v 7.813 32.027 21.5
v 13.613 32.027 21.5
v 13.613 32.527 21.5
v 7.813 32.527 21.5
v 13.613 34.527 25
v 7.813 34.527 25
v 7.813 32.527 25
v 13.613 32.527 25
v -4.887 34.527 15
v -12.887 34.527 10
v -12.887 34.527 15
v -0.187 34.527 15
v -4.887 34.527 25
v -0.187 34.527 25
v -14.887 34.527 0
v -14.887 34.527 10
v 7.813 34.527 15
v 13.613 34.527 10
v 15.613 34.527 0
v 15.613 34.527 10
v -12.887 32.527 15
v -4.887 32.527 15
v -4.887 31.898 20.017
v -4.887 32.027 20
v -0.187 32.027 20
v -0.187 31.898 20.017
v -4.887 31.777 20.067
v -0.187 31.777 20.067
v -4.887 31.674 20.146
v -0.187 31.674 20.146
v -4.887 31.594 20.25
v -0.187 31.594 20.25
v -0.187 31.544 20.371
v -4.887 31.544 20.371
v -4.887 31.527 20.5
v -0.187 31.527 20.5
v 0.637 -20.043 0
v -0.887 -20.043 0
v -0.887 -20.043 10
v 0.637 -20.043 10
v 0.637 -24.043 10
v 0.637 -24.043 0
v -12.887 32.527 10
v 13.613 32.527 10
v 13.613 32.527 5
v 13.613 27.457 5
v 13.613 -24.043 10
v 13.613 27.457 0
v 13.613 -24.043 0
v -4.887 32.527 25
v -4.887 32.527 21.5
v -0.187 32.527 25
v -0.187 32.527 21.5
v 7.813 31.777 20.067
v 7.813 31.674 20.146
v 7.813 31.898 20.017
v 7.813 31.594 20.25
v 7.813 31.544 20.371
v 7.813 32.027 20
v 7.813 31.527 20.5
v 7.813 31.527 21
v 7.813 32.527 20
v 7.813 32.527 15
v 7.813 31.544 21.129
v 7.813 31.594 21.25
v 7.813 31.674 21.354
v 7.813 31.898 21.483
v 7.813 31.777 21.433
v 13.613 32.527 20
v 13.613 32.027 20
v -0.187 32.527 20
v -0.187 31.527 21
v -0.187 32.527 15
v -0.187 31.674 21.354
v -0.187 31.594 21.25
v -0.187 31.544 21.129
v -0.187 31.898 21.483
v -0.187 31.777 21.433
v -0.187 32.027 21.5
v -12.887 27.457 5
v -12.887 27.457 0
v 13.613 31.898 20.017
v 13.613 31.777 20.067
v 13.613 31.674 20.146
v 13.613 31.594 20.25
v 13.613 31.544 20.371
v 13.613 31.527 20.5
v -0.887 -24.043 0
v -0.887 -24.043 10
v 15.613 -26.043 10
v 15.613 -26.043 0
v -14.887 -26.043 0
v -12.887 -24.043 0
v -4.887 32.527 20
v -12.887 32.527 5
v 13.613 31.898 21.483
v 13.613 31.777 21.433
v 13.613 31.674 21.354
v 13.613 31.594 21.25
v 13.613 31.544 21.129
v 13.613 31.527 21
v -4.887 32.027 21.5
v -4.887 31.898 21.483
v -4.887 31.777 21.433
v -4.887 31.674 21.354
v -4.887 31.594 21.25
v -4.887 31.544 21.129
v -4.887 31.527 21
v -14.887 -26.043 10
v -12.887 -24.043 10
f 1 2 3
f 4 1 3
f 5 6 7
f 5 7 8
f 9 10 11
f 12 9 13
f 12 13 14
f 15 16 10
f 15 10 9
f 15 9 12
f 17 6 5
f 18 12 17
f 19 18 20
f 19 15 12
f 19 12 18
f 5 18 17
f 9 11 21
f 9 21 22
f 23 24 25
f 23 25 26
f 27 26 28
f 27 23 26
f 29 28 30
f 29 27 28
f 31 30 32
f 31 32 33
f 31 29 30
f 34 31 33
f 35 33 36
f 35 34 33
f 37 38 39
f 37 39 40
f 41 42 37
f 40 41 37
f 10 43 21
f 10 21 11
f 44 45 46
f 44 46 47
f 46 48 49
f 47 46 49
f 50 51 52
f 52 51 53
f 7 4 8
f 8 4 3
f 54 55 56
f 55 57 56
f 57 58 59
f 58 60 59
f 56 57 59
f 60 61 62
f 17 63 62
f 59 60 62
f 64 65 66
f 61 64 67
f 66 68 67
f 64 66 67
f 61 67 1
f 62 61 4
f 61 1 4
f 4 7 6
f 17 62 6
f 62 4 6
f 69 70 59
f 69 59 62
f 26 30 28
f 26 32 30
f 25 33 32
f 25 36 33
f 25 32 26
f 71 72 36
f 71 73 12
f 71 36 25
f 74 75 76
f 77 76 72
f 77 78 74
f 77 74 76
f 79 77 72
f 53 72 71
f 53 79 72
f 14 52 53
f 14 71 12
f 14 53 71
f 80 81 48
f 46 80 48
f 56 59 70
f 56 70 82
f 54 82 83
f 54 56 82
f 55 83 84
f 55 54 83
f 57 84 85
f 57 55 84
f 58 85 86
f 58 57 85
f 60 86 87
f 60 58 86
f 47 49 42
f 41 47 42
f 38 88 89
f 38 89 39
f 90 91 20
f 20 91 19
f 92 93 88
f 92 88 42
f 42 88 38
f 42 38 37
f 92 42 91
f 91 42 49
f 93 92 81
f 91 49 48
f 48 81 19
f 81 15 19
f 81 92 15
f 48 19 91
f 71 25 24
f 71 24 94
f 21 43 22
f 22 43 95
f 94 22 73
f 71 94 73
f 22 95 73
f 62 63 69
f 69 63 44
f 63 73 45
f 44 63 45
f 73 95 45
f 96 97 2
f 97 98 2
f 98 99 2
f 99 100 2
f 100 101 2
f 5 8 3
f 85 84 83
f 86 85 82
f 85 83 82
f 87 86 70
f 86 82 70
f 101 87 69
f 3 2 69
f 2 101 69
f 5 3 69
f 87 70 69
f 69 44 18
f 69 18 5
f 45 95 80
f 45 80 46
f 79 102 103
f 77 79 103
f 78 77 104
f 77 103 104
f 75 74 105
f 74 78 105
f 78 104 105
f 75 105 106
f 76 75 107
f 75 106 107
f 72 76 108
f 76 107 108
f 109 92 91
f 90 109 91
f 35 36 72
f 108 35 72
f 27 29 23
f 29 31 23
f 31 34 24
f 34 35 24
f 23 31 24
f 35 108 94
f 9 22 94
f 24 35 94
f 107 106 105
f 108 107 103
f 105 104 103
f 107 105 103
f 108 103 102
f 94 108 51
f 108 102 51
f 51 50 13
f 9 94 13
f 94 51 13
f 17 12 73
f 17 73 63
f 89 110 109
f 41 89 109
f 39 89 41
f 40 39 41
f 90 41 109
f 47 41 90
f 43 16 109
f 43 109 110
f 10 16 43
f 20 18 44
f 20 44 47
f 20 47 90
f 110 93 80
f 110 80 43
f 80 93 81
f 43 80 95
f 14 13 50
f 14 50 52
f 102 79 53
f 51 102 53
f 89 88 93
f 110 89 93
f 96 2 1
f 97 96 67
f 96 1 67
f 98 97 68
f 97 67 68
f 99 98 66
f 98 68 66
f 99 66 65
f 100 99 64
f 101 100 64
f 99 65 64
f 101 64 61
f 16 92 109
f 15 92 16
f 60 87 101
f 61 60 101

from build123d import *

# Parameters (mm, degrees)
F0_W     = 30.5
F0_H     = 60.57
F0_W_2   = 1.524
F0_H_2   = 4
F1_DEPTH = 10
F0_W_3   = 26.5
F0_H_3   = 5.07
F2_DEPTH = 5
F3_W     = 26.5
F3_H     = 2
F4_DEPTH = 15
F5_W     = 1
F5_H     = 1.5
F6_DEPTH = 25.4
F7_R     = 0.5
F8_W     = 8
F8_H     = 7.14287
F9_DEPTH = 10


with BuildPart() as f1:
    # F0 (on Top) → F1 (new body)
    with BuildSketch(Plane.XY):
        with Locations((0.363031, 4.242457)):
            Rectangle(F0_W, F0_H)
        Polygon((-12.886969, 27.457457), (-12.886969, 32.527457), (13.613031, 32.527457), (13.613031, 27.457457), (13.613031, -24.042543), (0.637031, -24.042543), (-0.886969, -24.042543), (-12.886969, -24.042543), align=None, mode=Mode.SUBTRACT)
        with Locations((-0.124969, -22.042543)):
            Rectangle(F0_W_2, F0_H_2)
    extrude(amount=F1_DEPTH)

    # F0 (on Top) → F2 (join)
    with BuildSketch(Plane.XY):
        with Locations((0.363031, 29.992457)):
            Rectangle(F0_W_3, F0_H_3)
    extrude(amount=F2_DEPTH)

    # F3 (on face) → F4 (join)
    with BuildSketch(Plane.XY.offset(10)):
        with Locations((0.363031, 33.527457)):
            Rectangle(F3_W, F3_H)
    extrude(amount=F4_DEPTH)

    # F5 (on face) → F6 (join)
    with BuildSketch(Plane.YZ.offset(13.613031)):
        with Locations((32.027457, 20.75)):
            Rectangle(F5_W, F5_H)
    extrude(amount=-F6_DEPTH)

    # F7
    f7_edges = [f1.edges().sort_by_distance(p)[0] for p in [
        (0.913031, 31.527457, 21.5),
        (0.913031, 31.527457, 20),
    ]]
    fillet(f7_edges, radius=F7_R)

    # F8 (on face) → F9 (cut)
    with BuildSketch(Plane.XY.offset(25)):
        with Locations((-8.886969, 30.956022)):
            Rectangle(F8_W, F8_H)
        with Locations((3.813031, 30.956022)):
            Rectangle(F8_W, F8_H)
    extrude(amount=-F9_DEPTH, mode=Mode.SUBTRACT)


solid = f1.part
